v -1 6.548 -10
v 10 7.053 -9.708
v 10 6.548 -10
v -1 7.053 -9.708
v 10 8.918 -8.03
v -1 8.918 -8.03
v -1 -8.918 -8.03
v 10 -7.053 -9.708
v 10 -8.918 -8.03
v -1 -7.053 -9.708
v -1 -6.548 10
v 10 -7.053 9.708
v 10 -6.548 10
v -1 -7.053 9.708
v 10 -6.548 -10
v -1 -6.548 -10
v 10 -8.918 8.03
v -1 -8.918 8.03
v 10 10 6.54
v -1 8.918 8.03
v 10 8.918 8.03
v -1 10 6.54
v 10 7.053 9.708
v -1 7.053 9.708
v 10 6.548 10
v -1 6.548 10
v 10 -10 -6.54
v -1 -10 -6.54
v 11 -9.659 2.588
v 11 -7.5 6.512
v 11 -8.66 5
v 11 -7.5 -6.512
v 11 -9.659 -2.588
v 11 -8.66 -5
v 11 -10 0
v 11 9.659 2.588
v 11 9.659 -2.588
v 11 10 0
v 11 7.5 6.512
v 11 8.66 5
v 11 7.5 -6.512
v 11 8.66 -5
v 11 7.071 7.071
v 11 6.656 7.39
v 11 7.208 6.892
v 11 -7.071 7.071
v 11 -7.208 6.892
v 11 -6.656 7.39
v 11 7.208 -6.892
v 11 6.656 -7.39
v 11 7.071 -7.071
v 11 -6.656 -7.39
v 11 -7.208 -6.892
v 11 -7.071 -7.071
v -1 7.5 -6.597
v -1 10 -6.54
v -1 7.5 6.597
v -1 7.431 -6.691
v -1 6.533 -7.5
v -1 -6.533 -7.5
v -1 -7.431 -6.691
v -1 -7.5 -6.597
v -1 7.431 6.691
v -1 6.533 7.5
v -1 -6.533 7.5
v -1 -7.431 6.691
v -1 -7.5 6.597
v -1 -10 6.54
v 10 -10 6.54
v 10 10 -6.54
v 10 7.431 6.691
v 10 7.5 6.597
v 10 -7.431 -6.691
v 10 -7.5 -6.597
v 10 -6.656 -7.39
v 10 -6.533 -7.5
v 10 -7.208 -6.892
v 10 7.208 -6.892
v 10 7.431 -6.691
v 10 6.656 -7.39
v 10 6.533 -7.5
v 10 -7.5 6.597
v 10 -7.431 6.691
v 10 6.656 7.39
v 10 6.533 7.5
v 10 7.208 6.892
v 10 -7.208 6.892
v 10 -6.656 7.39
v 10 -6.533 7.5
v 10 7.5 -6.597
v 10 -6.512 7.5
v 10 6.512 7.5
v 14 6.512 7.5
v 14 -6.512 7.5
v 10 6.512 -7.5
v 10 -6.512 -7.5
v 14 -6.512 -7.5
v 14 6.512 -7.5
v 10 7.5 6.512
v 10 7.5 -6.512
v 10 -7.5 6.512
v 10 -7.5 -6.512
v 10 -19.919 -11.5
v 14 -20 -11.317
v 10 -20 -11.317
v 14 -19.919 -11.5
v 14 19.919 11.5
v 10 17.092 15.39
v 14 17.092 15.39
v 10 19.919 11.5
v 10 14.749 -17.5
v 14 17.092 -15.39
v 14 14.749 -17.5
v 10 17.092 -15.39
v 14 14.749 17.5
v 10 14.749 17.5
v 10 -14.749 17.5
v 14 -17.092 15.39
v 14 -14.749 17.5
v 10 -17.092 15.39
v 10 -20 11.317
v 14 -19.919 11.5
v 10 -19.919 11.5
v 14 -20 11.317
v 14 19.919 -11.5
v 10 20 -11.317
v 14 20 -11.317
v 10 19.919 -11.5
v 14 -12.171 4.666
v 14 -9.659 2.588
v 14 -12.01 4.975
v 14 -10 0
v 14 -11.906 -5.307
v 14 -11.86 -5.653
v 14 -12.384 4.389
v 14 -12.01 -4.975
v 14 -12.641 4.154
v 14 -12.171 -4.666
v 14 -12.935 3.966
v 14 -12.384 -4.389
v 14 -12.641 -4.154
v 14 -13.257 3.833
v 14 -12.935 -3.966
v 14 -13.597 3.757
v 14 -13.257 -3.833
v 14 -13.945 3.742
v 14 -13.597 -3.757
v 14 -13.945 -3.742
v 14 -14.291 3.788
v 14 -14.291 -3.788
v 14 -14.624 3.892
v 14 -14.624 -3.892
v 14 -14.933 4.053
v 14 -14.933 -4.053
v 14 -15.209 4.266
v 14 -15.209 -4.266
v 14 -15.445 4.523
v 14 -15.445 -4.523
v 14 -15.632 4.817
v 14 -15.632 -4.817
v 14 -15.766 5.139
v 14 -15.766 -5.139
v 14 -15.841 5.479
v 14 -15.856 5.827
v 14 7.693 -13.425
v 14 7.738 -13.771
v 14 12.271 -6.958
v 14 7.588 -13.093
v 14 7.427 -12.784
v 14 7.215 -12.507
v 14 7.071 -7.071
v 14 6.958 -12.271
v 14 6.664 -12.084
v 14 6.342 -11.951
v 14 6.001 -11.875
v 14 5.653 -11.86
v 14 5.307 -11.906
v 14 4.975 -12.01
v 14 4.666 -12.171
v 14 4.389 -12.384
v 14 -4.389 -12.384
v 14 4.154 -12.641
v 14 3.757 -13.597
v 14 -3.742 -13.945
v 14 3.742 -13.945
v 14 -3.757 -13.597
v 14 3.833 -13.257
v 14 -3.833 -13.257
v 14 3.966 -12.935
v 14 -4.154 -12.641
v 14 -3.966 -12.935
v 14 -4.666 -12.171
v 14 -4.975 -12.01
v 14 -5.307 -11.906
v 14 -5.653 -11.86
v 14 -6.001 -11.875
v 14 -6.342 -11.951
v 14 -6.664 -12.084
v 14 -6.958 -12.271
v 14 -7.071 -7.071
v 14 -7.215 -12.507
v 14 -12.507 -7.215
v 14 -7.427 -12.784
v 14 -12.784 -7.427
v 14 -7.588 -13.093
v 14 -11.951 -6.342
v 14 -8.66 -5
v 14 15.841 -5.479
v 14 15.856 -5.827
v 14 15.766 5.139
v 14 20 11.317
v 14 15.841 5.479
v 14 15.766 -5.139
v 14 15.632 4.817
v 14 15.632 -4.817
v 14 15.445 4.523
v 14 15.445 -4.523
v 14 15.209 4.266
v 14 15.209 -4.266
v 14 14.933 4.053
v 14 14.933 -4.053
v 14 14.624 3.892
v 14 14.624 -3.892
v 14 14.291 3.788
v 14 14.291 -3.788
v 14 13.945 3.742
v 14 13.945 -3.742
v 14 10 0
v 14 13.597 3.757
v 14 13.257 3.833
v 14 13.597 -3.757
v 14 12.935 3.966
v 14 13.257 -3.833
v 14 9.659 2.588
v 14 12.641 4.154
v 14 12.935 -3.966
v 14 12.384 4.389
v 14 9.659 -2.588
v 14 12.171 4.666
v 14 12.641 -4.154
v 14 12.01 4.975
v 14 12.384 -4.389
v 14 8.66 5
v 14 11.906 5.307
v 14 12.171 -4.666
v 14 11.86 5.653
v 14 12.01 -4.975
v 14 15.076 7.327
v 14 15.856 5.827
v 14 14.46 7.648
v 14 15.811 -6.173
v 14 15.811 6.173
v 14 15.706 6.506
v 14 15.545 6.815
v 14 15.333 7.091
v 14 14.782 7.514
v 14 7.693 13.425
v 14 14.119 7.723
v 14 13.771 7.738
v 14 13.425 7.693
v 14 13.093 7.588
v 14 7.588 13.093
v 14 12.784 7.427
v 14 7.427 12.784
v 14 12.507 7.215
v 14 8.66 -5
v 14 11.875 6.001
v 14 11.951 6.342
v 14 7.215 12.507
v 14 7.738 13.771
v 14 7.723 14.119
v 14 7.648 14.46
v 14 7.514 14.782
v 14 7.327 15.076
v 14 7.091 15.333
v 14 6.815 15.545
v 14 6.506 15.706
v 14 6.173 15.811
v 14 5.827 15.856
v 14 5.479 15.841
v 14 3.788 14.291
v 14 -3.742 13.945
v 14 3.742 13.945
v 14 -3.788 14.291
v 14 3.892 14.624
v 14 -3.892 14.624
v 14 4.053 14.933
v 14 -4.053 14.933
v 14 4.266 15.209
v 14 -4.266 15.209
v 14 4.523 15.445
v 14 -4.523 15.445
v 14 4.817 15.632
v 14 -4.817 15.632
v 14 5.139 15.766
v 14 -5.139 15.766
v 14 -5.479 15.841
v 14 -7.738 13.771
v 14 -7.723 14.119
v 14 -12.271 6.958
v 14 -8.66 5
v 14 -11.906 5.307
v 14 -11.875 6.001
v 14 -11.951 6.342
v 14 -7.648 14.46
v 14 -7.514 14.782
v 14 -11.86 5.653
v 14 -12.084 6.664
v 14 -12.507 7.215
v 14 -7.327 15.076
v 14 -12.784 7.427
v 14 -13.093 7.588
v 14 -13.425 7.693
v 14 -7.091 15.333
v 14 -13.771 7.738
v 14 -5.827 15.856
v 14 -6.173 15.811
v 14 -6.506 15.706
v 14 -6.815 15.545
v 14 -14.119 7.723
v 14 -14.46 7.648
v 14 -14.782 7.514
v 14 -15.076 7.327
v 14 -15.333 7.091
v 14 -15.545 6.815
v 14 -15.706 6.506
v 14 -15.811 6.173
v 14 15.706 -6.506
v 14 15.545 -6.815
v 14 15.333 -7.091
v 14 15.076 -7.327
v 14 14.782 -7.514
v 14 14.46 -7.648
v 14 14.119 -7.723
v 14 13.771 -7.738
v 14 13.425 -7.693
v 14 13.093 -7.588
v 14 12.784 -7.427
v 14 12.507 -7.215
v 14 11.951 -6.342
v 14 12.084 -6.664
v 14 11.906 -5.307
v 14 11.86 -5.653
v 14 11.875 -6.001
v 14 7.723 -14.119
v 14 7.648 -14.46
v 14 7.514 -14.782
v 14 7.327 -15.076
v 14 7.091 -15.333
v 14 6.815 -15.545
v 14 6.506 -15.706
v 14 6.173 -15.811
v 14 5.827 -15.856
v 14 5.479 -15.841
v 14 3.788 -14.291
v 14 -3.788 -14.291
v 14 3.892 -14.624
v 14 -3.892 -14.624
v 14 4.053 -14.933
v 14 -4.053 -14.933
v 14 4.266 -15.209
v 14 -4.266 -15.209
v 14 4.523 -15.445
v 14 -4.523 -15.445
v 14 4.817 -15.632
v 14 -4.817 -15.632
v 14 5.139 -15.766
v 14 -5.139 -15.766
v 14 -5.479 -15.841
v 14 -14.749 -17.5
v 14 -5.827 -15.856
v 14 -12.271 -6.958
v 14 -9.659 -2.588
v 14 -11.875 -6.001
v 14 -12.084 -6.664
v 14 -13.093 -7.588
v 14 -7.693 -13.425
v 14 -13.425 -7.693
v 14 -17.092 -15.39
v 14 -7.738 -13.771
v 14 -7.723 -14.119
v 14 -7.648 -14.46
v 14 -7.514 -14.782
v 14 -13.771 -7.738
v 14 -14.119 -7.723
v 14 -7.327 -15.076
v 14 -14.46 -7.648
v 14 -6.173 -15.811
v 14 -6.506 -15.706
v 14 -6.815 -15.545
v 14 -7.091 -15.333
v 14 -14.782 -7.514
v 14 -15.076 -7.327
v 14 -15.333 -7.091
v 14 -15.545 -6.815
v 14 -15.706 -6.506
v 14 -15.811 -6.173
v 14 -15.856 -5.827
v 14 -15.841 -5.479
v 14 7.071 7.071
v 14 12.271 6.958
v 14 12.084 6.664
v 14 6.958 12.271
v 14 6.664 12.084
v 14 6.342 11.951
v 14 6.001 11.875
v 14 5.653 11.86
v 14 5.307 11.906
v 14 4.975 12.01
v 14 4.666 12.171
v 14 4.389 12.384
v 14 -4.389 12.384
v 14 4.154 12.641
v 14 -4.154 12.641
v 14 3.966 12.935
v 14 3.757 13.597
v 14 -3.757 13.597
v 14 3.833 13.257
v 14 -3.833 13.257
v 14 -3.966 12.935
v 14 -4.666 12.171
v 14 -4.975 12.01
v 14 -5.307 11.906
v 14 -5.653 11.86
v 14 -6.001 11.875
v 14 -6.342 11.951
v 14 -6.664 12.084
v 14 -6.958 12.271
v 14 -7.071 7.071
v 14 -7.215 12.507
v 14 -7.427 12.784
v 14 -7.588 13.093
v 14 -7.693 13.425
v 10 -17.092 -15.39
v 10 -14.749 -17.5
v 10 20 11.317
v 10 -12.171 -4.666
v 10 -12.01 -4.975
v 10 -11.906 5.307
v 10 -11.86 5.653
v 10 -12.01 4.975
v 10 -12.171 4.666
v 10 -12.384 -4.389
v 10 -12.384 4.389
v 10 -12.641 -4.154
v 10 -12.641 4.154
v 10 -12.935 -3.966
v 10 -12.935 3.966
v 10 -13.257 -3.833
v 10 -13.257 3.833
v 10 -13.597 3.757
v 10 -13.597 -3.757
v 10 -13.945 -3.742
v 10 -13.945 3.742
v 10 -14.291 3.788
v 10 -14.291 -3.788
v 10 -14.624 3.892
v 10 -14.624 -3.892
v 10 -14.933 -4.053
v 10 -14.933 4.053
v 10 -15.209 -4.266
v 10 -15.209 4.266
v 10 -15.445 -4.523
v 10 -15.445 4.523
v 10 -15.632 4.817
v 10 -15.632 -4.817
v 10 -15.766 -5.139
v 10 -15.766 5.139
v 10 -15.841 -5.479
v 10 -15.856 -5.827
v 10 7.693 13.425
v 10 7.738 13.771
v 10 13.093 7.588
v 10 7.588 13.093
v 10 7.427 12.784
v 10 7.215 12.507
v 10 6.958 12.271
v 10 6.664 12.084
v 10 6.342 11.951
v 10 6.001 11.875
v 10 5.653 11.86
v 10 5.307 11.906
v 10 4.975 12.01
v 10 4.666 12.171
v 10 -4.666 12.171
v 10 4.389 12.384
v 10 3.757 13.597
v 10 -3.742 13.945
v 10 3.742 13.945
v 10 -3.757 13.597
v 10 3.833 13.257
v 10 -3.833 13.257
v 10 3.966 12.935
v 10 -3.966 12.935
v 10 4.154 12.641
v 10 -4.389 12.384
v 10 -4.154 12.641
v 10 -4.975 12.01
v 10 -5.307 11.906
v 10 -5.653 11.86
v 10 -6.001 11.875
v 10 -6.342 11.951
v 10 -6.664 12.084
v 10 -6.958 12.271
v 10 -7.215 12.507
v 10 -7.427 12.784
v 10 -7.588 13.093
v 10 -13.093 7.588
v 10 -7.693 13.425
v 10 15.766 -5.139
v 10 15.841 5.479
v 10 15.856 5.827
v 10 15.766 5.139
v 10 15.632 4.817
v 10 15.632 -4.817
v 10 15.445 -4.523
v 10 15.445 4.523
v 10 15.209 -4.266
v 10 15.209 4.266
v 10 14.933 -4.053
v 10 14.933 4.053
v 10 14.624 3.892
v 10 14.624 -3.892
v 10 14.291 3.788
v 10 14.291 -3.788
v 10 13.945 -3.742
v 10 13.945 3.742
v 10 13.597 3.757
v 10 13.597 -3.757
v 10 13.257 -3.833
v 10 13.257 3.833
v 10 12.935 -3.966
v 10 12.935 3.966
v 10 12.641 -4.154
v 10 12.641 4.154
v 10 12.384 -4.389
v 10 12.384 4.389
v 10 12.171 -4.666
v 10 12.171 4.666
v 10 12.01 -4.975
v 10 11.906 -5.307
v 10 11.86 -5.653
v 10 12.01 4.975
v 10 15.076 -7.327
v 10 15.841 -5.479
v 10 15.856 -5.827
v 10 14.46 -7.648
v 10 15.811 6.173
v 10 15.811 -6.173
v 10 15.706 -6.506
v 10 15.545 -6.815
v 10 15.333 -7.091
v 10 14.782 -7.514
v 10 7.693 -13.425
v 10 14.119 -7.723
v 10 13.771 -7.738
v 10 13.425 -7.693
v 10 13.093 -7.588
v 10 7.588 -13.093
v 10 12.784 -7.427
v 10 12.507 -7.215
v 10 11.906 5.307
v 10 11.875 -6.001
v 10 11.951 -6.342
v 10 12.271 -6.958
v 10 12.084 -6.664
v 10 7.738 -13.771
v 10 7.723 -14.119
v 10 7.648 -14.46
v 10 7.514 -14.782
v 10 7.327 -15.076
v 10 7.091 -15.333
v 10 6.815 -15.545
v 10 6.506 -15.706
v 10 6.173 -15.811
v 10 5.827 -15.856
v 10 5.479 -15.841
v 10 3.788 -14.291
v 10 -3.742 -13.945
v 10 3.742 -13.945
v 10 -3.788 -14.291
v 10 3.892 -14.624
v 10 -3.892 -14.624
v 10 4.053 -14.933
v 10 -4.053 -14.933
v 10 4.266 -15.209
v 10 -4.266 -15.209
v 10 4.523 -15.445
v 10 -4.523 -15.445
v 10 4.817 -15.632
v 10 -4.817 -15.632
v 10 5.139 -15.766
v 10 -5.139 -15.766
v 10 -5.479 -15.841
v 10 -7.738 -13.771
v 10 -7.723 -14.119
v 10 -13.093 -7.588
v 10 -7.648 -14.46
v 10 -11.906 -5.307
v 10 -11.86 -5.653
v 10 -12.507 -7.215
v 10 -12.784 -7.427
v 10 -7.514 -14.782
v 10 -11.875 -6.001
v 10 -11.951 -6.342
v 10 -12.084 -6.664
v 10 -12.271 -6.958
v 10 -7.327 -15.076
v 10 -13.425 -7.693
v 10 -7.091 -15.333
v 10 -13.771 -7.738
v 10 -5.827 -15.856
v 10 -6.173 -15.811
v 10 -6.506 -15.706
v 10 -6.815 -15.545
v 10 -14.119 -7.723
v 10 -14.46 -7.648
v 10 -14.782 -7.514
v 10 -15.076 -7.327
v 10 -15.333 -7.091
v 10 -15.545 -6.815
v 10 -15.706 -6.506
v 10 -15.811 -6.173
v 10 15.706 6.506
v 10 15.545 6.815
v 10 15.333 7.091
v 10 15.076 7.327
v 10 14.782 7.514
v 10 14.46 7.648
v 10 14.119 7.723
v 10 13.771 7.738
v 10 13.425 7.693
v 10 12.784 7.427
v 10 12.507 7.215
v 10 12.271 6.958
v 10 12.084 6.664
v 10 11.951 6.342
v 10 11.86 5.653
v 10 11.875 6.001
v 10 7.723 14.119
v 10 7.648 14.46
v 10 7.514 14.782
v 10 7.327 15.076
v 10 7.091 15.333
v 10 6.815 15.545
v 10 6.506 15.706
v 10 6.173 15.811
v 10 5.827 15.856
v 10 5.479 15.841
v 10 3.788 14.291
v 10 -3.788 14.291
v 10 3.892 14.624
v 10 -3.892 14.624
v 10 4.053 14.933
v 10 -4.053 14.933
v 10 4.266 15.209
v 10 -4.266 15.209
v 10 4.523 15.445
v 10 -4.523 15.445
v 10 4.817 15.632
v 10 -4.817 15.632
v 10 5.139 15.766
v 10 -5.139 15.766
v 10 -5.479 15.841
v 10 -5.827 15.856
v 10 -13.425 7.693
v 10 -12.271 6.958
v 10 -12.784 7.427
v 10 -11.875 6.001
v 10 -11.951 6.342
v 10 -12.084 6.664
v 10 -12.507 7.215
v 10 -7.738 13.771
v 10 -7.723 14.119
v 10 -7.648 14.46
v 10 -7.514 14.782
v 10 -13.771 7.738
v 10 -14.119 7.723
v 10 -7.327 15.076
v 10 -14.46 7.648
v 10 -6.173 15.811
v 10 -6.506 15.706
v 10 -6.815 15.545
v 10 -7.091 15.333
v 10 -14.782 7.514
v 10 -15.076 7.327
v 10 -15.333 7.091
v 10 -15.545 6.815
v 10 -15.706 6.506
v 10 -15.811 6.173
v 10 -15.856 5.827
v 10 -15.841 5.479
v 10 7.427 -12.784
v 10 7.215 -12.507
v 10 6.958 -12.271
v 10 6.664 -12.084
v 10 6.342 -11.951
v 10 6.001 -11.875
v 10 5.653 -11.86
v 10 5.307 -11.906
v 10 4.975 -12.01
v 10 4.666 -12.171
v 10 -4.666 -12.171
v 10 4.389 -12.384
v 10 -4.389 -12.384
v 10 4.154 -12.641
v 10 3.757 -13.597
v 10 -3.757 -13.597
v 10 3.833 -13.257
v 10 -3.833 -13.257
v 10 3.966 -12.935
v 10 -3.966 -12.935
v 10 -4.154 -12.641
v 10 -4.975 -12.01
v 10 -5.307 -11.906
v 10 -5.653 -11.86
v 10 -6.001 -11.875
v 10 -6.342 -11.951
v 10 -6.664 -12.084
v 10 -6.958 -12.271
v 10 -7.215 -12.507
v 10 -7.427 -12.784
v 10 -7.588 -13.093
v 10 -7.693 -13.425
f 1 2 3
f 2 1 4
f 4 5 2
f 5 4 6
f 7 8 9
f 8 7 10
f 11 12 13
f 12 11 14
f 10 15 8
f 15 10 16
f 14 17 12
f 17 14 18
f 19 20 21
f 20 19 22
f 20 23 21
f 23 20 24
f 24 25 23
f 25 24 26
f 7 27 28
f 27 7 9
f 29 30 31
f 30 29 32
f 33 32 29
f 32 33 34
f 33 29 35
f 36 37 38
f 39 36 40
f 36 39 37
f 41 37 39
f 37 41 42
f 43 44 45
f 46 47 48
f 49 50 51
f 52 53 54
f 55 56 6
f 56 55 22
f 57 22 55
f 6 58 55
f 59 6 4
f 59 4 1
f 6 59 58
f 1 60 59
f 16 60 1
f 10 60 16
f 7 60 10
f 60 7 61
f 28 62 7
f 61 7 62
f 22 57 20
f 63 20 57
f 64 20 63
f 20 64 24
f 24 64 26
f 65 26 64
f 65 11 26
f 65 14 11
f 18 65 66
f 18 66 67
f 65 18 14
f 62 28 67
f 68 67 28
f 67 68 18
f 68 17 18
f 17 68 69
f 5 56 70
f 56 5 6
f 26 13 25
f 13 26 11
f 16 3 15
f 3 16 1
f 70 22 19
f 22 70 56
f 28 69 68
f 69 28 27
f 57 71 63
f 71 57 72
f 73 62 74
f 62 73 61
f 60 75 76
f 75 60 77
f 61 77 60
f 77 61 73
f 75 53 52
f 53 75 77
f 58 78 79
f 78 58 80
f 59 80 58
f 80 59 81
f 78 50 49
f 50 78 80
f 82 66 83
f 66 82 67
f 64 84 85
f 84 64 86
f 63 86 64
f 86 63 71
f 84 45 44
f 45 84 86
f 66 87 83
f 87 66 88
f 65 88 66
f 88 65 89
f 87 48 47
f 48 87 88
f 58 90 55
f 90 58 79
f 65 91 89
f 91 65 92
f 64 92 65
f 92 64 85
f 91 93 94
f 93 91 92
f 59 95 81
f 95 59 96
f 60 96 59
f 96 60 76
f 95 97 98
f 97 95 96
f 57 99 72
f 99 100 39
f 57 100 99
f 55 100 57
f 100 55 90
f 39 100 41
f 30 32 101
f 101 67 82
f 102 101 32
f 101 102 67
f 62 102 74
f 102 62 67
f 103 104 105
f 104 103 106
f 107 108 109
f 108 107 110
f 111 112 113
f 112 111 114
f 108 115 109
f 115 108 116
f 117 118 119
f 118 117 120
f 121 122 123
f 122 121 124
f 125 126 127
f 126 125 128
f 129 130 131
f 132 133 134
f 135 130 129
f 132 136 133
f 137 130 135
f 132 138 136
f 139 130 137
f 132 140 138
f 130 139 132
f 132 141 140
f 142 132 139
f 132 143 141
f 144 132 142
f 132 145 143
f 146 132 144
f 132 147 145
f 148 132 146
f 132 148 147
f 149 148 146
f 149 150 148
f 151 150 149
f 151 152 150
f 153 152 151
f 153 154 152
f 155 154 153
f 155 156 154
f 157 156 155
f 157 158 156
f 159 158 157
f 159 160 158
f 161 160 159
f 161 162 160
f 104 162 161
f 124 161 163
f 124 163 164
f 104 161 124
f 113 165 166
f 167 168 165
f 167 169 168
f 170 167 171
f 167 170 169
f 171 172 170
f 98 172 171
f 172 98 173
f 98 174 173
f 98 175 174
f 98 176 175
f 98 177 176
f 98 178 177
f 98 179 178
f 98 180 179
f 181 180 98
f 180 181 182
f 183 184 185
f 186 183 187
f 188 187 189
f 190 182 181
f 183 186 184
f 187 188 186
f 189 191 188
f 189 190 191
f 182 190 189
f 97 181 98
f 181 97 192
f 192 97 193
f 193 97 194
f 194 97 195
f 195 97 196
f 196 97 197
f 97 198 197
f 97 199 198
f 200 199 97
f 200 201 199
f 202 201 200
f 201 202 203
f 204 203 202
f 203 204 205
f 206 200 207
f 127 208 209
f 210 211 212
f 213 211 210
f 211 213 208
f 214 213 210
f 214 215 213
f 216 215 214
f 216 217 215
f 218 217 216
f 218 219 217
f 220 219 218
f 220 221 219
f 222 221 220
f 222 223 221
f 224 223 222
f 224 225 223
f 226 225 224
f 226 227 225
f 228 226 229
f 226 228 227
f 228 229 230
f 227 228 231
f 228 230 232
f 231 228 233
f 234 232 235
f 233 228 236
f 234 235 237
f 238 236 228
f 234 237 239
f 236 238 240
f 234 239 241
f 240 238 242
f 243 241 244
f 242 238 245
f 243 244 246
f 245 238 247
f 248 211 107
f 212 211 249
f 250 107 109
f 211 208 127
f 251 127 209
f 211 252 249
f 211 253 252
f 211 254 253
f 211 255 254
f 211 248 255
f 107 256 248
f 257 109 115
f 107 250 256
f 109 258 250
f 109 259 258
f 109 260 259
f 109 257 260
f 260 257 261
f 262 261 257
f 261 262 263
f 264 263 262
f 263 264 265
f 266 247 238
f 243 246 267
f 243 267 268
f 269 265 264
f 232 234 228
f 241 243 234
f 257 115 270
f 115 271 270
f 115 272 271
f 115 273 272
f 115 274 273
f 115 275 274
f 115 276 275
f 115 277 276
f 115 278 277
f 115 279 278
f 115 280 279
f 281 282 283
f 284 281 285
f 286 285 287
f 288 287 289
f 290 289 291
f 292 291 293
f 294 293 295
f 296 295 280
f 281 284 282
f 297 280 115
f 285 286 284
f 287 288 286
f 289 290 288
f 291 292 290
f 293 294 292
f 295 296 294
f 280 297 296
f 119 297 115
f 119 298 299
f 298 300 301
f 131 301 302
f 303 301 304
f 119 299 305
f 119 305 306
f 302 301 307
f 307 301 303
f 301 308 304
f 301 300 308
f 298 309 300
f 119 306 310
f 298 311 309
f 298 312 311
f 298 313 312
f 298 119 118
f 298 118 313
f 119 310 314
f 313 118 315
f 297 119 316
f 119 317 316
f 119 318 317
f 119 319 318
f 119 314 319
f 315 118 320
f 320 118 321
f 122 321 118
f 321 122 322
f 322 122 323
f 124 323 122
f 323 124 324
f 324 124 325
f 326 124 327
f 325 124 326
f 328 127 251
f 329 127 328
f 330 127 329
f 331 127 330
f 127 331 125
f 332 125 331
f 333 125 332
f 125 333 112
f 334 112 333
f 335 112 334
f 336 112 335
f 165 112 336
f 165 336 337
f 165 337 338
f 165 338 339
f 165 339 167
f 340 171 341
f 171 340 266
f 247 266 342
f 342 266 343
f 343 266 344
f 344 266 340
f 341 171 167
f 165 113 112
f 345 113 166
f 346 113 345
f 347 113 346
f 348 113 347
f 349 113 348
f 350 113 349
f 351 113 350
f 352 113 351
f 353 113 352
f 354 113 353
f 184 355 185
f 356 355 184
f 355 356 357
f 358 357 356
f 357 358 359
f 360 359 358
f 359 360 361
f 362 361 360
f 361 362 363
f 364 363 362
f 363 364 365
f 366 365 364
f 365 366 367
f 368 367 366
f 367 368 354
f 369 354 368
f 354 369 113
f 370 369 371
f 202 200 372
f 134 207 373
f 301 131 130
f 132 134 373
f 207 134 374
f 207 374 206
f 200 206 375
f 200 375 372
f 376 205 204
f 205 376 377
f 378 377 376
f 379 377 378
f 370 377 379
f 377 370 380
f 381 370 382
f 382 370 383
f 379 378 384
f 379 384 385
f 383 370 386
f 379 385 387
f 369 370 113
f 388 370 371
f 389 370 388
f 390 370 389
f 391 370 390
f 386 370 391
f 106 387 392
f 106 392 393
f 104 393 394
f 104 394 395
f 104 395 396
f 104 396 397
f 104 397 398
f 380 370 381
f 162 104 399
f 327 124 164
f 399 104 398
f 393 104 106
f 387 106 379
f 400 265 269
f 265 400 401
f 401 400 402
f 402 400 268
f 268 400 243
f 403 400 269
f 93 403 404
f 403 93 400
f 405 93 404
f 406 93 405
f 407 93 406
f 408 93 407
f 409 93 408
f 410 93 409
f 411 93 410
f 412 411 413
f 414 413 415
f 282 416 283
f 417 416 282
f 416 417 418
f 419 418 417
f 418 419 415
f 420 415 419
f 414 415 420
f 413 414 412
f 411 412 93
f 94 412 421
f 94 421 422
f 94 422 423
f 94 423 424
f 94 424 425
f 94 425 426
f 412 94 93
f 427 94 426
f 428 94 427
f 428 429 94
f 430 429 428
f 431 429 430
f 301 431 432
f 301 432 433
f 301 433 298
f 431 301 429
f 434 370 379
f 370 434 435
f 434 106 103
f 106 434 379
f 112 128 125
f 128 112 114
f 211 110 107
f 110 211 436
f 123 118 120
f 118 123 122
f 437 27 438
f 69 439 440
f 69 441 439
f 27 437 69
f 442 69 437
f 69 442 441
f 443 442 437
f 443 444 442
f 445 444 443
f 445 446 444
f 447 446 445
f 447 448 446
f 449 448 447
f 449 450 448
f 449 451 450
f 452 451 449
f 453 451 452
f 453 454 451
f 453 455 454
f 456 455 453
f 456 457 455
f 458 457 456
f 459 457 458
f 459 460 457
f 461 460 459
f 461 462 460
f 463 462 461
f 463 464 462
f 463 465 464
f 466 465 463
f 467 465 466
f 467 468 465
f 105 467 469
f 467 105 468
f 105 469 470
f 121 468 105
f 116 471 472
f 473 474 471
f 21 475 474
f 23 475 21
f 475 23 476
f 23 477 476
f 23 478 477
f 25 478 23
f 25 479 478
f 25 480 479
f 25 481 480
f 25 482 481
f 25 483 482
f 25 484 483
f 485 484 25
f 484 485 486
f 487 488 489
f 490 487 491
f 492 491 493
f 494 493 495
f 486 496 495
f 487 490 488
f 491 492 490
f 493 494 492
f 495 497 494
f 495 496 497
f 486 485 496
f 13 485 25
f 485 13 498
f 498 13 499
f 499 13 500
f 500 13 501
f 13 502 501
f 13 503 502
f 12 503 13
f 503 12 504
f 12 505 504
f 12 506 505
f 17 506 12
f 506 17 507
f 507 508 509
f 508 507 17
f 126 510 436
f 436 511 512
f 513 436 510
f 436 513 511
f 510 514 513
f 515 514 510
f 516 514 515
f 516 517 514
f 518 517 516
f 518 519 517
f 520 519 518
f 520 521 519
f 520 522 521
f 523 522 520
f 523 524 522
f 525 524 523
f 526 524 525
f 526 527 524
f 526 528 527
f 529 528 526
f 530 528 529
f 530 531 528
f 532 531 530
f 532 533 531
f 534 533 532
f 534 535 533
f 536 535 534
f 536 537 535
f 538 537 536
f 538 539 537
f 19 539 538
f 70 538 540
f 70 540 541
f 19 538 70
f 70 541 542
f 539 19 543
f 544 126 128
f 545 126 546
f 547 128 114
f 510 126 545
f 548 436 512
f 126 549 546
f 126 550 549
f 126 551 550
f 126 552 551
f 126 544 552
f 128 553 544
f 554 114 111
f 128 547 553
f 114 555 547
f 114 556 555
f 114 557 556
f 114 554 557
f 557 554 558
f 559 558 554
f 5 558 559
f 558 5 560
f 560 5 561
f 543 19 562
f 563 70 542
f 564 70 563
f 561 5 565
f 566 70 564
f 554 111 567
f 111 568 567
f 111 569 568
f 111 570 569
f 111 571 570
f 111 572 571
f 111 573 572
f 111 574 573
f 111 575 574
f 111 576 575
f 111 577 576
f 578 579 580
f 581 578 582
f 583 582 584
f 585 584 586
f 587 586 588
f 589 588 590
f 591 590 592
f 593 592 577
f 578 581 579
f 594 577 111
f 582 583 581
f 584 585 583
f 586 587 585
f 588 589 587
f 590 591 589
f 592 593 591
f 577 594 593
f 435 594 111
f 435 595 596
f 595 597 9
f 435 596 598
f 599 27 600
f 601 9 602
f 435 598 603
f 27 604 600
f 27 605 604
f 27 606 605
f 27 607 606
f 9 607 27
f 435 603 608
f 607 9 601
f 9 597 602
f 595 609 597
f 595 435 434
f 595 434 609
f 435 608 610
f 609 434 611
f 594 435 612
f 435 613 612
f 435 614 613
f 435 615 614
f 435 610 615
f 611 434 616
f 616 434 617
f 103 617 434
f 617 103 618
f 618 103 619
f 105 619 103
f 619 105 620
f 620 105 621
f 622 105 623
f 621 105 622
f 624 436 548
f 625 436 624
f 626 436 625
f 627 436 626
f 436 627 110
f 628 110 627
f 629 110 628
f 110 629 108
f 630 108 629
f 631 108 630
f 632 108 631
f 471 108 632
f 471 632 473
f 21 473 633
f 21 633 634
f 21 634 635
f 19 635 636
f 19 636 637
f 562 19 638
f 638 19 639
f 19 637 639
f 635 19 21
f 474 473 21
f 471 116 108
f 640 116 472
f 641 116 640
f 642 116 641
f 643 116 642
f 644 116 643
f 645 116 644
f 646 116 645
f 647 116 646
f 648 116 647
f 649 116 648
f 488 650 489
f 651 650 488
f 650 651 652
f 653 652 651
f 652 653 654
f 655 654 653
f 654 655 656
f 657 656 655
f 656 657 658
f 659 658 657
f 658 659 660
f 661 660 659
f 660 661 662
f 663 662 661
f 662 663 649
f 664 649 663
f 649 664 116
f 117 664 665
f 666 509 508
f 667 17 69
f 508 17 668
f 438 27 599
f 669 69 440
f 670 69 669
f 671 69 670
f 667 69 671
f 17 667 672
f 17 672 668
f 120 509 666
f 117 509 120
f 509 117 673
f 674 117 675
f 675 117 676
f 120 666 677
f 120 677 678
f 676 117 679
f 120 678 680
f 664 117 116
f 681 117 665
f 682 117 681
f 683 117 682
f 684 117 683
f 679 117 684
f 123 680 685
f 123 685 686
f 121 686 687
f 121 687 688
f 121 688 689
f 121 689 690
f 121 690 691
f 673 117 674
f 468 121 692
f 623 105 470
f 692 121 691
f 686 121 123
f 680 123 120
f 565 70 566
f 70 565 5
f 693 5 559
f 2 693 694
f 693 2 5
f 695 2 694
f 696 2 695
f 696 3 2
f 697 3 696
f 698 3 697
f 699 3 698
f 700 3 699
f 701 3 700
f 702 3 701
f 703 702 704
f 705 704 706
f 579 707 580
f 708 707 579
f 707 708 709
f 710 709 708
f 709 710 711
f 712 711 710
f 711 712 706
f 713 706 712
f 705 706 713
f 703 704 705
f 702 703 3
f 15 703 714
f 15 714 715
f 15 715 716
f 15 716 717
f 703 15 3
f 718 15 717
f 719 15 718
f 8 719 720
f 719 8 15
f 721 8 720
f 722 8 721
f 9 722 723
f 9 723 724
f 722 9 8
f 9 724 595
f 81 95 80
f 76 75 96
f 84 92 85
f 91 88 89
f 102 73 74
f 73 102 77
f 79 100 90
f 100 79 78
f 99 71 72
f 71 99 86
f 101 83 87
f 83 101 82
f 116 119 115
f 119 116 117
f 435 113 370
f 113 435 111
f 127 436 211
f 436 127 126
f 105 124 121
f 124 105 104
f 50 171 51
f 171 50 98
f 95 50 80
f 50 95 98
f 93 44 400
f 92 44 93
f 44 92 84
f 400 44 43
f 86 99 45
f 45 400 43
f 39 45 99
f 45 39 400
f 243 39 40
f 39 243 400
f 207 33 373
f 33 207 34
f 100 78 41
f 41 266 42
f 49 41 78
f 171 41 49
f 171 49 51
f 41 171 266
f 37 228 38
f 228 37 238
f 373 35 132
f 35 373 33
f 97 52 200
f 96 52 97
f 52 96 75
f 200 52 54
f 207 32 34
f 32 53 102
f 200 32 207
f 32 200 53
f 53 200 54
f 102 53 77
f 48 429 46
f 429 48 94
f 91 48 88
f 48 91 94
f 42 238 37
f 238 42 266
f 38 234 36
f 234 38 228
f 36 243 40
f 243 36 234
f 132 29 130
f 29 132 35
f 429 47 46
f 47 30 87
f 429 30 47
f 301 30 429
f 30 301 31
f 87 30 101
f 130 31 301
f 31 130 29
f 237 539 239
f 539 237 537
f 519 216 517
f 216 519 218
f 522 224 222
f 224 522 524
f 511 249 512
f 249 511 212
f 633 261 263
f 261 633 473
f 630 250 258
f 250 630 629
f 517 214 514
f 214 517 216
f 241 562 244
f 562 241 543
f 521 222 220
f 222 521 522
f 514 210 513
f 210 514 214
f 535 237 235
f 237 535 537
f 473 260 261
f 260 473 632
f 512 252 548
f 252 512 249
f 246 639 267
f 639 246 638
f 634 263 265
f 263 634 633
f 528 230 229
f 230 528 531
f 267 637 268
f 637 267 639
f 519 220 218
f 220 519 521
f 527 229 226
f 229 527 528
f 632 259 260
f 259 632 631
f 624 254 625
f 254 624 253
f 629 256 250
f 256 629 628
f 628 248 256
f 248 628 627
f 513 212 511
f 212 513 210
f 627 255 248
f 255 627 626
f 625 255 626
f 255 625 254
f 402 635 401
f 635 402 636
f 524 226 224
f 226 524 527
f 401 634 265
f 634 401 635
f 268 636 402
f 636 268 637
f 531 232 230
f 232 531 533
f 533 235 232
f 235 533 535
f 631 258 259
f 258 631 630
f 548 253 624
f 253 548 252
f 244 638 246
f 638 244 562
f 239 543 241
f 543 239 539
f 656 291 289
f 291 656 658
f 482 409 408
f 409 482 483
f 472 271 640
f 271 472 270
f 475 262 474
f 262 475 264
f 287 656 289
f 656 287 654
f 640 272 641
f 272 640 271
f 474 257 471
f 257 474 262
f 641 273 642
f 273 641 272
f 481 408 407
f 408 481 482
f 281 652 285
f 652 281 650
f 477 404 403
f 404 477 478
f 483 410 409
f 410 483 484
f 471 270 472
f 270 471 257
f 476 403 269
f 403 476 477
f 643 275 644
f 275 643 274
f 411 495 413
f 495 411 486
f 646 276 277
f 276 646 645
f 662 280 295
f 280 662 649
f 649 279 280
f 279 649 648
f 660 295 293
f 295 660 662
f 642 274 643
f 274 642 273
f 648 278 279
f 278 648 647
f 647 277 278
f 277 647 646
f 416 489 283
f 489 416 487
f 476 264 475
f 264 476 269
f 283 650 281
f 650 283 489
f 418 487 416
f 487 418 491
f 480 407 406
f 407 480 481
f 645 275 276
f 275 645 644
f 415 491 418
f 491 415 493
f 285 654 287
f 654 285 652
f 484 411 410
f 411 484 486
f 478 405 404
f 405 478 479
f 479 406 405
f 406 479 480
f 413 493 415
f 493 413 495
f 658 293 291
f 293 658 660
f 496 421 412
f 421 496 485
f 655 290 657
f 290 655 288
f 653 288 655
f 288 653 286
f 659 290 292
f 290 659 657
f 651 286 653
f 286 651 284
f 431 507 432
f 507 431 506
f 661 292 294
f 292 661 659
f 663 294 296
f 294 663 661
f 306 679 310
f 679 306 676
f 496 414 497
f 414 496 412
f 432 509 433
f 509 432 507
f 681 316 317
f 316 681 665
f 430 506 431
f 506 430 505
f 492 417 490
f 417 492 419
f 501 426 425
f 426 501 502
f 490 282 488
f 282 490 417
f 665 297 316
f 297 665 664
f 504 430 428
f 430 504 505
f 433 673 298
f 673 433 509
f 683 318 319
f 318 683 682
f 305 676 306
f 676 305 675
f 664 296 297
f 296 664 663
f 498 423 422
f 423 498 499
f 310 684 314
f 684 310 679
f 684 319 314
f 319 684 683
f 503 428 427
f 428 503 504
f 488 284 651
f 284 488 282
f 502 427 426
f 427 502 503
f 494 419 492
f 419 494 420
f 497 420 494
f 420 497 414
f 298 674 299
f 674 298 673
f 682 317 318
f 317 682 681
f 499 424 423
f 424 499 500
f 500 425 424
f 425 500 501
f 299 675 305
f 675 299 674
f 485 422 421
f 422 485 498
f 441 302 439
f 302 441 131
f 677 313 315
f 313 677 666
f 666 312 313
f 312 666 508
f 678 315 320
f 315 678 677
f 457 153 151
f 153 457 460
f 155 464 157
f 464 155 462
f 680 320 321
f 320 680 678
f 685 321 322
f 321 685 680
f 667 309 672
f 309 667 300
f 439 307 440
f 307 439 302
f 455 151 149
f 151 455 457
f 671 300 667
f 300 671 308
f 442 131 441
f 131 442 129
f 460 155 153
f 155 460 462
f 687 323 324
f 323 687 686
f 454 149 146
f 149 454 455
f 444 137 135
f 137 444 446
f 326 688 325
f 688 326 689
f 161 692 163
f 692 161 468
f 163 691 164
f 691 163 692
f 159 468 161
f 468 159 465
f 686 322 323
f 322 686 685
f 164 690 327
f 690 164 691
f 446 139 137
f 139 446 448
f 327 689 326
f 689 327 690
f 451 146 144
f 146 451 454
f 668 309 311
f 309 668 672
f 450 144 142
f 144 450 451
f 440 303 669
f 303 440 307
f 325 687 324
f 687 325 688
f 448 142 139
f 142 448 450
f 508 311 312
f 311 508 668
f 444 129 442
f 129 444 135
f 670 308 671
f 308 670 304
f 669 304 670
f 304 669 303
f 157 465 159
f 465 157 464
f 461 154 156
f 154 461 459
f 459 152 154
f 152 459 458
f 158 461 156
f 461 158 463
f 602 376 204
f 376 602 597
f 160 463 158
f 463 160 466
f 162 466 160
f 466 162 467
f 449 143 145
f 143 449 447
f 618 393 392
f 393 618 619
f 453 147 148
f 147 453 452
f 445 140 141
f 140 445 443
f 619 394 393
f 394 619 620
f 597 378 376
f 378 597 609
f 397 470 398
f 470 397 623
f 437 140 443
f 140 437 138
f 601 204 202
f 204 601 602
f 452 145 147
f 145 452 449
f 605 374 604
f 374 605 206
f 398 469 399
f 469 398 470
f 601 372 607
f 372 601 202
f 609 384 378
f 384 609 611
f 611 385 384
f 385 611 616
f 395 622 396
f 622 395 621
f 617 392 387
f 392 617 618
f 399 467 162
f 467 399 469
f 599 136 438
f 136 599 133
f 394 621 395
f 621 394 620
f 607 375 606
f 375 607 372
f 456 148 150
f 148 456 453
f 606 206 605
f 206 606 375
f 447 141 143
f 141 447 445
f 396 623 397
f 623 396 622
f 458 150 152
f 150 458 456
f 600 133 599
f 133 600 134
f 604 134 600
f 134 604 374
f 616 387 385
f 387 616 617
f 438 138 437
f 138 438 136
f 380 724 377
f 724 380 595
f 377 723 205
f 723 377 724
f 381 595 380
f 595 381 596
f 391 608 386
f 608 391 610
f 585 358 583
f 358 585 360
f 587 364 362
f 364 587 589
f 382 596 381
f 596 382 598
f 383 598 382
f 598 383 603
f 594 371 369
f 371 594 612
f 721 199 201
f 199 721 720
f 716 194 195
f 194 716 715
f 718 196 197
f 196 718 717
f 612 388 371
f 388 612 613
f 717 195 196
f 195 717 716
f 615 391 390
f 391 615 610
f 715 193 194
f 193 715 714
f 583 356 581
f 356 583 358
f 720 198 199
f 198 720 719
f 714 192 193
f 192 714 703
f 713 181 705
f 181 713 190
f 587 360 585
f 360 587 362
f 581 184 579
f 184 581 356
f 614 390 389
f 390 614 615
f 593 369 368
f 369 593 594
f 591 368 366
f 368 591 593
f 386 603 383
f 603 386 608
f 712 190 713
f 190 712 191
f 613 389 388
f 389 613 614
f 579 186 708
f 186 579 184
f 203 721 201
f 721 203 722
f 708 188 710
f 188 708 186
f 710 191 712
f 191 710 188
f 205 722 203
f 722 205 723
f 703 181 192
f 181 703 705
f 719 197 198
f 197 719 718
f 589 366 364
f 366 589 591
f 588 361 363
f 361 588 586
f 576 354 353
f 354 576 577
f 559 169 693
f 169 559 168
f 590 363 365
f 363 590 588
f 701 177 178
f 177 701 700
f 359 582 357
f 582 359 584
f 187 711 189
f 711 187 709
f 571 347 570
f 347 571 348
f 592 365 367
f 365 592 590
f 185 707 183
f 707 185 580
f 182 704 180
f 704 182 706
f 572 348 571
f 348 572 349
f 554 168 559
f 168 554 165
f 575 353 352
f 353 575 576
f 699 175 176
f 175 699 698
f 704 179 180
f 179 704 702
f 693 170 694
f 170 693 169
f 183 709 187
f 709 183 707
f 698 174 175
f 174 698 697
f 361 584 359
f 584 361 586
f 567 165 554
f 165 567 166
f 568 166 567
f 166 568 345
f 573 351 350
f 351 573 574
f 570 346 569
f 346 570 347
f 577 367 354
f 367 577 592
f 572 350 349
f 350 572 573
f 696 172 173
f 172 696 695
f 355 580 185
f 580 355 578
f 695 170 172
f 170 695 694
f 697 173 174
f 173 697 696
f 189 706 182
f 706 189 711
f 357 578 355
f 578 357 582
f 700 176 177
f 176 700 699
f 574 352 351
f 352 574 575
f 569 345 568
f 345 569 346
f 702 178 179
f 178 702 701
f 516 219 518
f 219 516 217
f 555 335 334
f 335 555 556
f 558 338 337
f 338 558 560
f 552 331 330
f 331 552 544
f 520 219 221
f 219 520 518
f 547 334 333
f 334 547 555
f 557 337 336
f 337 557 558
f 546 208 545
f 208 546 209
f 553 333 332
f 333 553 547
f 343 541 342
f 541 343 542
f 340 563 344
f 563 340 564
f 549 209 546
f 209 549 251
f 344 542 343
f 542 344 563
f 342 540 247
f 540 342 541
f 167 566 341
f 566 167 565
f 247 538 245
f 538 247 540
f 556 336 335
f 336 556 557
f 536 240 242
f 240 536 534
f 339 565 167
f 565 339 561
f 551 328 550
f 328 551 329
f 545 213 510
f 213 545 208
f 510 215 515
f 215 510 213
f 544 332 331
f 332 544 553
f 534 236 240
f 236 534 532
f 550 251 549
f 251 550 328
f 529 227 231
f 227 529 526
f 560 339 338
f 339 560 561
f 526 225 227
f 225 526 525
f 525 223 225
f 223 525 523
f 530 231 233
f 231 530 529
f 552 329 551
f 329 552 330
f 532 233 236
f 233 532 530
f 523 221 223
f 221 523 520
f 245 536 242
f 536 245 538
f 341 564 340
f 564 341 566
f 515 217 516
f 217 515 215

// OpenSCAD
module flangeBody(){
	difference(){
		//tubeBody
		intersection(){
			translate([5,0,0]) rotate([0,90,0]) cylinder(h=12,r=12,center=true);
			translate([5,0,0]) cube(size=[20,20,20],center=true);
		}
		//throat
		intersection(){
			translate([5,0,0]) rotate([0,90,0]) cylinder(h=13,r=10,center=true);
			translate([5,0,0]) cube(size=[15,15,15],center=true);
		}
	}
}

module flangeFace(){
	difference(){
		union(){
			difference(){
				//flange
				intersection(){
					translate([12,0,0]) rotate([0,90,0]) cylinder(r=23,h=4,center=true);
					translate([12,0,0]) cube(size=[10,40,35],center=true);
				}
				//flangeThroat
				intersection(){
					translate([12,0,0]) rotate([0,90,0]) cylinder(r=10,h=5,$fn=24,center=true);
					translate([12,0,0]) cube(size=[10,20,15],center=true);
				}
			}
		}
		//tubeMountingHoles
		rotate([22.5,0,0]){
			for ( v = [0 : 8] ){
				rotate( v * 360 / 8, [1, 0, 0]){
					translate([12, 15, 0]){
						rotate([0,90,0]){
							cylinder(r=2,h=5,$fn=36,center=true);
						}
					}
				}
			}
		}
	}
}

module flange(){
	union(){
		flangeBody();
		flangeFace();
	}
}

flange();
